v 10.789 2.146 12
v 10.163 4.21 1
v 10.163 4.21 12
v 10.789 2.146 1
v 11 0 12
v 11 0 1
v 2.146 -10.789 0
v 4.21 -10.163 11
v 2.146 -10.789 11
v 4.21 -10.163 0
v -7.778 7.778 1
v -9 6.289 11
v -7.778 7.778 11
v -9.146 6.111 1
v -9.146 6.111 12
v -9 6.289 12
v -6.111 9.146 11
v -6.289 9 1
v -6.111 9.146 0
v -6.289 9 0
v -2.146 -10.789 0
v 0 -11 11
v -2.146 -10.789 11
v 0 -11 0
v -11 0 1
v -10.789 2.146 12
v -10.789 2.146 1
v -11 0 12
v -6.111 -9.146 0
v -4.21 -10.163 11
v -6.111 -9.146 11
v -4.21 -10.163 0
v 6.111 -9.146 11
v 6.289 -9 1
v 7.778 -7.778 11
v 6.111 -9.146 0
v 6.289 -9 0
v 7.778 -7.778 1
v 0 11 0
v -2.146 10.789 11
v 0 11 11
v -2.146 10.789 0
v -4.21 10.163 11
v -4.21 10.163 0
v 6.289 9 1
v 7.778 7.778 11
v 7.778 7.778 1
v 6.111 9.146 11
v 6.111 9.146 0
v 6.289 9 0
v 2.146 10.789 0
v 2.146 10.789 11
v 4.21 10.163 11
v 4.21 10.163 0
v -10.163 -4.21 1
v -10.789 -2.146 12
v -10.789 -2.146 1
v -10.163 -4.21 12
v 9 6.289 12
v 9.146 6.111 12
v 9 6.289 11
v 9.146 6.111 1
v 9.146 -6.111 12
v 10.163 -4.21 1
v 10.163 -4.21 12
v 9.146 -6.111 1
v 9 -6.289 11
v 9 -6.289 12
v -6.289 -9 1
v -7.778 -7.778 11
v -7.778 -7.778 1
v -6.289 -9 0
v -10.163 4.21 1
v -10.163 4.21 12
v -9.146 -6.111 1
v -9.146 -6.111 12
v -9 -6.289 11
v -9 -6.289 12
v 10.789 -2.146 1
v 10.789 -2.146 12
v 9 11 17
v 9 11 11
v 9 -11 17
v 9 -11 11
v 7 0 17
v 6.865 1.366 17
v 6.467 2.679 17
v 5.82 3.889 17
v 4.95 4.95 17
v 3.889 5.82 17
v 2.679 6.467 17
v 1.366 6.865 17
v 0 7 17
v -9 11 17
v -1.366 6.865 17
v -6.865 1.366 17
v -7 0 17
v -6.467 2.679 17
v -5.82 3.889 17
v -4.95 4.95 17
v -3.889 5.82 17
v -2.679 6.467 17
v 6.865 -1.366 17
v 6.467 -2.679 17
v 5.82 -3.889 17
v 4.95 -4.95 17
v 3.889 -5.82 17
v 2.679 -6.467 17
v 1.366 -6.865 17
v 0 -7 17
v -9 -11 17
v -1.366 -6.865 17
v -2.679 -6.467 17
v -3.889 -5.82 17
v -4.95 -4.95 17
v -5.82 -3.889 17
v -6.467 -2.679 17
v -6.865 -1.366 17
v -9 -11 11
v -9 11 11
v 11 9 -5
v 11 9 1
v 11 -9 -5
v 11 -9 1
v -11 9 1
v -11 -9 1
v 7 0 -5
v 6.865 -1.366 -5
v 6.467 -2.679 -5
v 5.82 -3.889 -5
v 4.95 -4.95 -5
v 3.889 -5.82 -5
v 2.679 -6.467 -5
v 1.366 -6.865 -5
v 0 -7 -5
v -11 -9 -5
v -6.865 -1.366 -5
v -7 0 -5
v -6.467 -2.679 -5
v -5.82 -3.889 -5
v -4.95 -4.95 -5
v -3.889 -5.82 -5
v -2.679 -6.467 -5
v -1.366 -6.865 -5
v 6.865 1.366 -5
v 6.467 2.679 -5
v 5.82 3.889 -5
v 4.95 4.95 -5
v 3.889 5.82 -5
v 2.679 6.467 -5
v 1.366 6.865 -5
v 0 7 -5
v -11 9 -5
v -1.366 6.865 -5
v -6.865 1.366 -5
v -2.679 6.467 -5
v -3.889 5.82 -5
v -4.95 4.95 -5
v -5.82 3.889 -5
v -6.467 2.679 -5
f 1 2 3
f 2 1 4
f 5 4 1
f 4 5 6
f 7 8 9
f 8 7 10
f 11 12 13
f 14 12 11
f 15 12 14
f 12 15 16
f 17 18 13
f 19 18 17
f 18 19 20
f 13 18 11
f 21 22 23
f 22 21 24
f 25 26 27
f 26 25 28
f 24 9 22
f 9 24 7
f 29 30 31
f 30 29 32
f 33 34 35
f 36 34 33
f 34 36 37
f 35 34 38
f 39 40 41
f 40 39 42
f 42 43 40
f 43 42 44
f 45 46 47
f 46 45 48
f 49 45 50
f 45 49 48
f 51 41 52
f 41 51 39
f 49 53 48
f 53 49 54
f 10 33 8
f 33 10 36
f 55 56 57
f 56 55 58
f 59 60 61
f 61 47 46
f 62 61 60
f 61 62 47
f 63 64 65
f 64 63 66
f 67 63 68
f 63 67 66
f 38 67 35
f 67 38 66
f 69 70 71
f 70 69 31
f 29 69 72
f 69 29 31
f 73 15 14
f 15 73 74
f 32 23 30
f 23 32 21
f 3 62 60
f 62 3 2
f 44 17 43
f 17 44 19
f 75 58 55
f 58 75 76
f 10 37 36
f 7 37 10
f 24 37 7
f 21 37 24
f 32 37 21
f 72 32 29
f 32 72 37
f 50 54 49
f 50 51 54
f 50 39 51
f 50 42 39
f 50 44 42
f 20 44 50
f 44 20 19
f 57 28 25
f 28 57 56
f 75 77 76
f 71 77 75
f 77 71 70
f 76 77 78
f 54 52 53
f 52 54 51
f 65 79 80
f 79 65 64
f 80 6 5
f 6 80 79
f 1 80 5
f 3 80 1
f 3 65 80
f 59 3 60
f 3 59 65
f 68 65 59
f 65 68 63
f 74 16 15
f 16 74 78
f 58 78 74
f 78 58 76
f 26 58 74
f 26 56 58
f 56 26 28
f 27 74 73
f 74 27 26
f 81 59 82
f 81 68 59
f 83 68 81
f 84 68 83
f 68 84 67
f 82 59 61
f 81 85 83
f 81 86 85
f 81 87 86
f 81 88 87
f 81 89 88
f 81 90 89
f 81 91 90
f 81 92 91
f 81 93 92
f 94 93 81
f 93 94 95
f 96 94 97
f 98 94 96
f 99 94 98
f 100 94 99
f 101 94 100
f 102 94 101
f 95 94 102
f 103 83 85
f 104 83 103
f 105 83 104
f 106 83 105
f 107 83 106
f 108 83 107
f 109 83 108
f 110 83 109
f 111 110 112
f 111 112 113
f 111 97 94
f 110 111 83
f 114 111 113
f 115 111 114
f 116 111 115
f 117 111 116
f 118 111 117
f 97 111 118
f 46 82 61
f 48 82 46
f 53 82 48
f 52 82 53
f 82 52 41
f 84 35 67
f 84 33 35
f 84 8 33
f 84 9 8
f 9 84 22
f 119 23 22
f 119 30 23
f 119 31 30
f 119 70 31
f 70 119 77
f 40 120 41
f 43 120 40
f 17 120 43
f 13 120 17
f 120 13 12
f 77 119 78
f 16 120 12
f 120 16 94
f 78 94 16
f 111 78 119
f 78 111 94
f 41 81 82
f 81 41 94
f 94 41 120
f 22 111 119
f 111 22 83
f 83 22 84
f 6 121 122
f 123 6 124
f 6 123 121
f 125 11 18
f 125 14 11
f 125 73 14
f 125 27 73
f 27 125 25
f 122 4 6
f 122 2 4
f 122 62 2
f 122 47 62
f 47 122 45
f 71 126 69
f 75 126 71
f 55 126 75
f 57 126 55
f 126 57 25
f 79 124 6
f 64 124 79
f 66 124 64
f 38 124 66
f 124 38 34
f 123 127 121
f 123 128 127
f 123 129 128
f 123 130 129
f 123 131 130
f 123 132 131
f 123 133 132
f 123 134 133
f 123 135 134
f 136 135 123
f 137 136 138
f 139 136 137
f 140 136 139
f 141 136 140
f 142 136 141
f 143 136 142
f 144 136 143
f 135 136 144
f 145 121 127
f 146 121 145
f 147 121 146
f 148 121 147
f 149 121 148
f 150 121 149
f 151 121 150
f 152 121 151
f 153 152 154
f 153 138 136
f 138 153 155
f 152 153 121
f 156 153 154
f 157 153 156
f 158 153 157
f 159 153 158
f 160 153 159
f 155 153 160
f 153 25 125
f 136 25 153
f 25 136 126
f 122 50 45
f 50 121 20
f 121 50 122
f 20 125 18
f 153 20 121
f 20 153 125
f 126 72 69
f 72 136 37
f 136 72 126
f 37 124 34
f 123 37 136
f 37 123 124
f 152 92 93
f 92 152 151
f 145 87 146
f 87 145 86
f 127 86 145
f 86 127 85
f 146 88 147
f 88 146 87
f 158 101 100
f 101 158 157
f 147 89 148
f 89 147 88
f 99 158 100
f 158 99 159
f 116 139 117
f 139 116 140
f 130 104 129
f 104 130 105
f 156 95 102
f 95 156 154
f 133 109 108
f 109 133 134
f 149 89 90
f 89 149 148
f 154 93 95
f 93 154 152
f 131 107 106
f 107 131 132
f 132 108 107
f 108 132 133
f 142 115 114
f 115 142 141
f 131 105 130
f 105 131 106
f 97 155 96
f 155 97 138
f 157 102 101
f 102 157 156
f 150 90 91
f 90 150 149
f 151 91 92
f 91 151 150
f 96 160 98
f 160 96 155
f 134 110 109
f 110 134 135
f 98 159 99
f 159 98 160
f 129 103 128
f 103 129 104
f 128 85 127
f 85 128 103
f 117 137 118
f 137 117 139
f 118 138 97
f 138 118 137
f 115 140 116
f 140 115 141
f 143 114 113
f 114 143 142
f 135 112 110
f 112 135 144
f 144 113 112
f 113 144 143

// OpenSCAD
$fn = 32;

// ----------------------------------------------------------------------
// Oldham coupling disc: 22 x 22 mm
// ----------------------------------------------------------------------

// --- parameters (mm) ---
disc_d = 22;              // disc diameter
disc_t = 12;              // disc thickness
tongue_w = 18;            // tongue width
tongue_h = 5;             // tongue height
bore_d = 14;              // centre lightening bore

module disc() {
  cylinder(h = disc_t, d = disc_d);
  /* tongue on the top face, sunk 1 mm into the disc */
  translate([-tongue_w / 2, -disc_d / 2, disc_t - 1]) cube([tongue_w, disc_d, tongue_h + 1]);
  /* slot wall on the bottom face, 90 degrees turned */
  translate([-disc_d / 2, -tongue_w / 2, -tongue_h]) cube([disc_d, tongue_w, tongue_h + 1]);
}

difference() {
  disc();
  translate([0, 0, -tongue_h - 1]) cylinder(h = disc_t + 2 * tongue_h + 2, d = bore_d);
}
